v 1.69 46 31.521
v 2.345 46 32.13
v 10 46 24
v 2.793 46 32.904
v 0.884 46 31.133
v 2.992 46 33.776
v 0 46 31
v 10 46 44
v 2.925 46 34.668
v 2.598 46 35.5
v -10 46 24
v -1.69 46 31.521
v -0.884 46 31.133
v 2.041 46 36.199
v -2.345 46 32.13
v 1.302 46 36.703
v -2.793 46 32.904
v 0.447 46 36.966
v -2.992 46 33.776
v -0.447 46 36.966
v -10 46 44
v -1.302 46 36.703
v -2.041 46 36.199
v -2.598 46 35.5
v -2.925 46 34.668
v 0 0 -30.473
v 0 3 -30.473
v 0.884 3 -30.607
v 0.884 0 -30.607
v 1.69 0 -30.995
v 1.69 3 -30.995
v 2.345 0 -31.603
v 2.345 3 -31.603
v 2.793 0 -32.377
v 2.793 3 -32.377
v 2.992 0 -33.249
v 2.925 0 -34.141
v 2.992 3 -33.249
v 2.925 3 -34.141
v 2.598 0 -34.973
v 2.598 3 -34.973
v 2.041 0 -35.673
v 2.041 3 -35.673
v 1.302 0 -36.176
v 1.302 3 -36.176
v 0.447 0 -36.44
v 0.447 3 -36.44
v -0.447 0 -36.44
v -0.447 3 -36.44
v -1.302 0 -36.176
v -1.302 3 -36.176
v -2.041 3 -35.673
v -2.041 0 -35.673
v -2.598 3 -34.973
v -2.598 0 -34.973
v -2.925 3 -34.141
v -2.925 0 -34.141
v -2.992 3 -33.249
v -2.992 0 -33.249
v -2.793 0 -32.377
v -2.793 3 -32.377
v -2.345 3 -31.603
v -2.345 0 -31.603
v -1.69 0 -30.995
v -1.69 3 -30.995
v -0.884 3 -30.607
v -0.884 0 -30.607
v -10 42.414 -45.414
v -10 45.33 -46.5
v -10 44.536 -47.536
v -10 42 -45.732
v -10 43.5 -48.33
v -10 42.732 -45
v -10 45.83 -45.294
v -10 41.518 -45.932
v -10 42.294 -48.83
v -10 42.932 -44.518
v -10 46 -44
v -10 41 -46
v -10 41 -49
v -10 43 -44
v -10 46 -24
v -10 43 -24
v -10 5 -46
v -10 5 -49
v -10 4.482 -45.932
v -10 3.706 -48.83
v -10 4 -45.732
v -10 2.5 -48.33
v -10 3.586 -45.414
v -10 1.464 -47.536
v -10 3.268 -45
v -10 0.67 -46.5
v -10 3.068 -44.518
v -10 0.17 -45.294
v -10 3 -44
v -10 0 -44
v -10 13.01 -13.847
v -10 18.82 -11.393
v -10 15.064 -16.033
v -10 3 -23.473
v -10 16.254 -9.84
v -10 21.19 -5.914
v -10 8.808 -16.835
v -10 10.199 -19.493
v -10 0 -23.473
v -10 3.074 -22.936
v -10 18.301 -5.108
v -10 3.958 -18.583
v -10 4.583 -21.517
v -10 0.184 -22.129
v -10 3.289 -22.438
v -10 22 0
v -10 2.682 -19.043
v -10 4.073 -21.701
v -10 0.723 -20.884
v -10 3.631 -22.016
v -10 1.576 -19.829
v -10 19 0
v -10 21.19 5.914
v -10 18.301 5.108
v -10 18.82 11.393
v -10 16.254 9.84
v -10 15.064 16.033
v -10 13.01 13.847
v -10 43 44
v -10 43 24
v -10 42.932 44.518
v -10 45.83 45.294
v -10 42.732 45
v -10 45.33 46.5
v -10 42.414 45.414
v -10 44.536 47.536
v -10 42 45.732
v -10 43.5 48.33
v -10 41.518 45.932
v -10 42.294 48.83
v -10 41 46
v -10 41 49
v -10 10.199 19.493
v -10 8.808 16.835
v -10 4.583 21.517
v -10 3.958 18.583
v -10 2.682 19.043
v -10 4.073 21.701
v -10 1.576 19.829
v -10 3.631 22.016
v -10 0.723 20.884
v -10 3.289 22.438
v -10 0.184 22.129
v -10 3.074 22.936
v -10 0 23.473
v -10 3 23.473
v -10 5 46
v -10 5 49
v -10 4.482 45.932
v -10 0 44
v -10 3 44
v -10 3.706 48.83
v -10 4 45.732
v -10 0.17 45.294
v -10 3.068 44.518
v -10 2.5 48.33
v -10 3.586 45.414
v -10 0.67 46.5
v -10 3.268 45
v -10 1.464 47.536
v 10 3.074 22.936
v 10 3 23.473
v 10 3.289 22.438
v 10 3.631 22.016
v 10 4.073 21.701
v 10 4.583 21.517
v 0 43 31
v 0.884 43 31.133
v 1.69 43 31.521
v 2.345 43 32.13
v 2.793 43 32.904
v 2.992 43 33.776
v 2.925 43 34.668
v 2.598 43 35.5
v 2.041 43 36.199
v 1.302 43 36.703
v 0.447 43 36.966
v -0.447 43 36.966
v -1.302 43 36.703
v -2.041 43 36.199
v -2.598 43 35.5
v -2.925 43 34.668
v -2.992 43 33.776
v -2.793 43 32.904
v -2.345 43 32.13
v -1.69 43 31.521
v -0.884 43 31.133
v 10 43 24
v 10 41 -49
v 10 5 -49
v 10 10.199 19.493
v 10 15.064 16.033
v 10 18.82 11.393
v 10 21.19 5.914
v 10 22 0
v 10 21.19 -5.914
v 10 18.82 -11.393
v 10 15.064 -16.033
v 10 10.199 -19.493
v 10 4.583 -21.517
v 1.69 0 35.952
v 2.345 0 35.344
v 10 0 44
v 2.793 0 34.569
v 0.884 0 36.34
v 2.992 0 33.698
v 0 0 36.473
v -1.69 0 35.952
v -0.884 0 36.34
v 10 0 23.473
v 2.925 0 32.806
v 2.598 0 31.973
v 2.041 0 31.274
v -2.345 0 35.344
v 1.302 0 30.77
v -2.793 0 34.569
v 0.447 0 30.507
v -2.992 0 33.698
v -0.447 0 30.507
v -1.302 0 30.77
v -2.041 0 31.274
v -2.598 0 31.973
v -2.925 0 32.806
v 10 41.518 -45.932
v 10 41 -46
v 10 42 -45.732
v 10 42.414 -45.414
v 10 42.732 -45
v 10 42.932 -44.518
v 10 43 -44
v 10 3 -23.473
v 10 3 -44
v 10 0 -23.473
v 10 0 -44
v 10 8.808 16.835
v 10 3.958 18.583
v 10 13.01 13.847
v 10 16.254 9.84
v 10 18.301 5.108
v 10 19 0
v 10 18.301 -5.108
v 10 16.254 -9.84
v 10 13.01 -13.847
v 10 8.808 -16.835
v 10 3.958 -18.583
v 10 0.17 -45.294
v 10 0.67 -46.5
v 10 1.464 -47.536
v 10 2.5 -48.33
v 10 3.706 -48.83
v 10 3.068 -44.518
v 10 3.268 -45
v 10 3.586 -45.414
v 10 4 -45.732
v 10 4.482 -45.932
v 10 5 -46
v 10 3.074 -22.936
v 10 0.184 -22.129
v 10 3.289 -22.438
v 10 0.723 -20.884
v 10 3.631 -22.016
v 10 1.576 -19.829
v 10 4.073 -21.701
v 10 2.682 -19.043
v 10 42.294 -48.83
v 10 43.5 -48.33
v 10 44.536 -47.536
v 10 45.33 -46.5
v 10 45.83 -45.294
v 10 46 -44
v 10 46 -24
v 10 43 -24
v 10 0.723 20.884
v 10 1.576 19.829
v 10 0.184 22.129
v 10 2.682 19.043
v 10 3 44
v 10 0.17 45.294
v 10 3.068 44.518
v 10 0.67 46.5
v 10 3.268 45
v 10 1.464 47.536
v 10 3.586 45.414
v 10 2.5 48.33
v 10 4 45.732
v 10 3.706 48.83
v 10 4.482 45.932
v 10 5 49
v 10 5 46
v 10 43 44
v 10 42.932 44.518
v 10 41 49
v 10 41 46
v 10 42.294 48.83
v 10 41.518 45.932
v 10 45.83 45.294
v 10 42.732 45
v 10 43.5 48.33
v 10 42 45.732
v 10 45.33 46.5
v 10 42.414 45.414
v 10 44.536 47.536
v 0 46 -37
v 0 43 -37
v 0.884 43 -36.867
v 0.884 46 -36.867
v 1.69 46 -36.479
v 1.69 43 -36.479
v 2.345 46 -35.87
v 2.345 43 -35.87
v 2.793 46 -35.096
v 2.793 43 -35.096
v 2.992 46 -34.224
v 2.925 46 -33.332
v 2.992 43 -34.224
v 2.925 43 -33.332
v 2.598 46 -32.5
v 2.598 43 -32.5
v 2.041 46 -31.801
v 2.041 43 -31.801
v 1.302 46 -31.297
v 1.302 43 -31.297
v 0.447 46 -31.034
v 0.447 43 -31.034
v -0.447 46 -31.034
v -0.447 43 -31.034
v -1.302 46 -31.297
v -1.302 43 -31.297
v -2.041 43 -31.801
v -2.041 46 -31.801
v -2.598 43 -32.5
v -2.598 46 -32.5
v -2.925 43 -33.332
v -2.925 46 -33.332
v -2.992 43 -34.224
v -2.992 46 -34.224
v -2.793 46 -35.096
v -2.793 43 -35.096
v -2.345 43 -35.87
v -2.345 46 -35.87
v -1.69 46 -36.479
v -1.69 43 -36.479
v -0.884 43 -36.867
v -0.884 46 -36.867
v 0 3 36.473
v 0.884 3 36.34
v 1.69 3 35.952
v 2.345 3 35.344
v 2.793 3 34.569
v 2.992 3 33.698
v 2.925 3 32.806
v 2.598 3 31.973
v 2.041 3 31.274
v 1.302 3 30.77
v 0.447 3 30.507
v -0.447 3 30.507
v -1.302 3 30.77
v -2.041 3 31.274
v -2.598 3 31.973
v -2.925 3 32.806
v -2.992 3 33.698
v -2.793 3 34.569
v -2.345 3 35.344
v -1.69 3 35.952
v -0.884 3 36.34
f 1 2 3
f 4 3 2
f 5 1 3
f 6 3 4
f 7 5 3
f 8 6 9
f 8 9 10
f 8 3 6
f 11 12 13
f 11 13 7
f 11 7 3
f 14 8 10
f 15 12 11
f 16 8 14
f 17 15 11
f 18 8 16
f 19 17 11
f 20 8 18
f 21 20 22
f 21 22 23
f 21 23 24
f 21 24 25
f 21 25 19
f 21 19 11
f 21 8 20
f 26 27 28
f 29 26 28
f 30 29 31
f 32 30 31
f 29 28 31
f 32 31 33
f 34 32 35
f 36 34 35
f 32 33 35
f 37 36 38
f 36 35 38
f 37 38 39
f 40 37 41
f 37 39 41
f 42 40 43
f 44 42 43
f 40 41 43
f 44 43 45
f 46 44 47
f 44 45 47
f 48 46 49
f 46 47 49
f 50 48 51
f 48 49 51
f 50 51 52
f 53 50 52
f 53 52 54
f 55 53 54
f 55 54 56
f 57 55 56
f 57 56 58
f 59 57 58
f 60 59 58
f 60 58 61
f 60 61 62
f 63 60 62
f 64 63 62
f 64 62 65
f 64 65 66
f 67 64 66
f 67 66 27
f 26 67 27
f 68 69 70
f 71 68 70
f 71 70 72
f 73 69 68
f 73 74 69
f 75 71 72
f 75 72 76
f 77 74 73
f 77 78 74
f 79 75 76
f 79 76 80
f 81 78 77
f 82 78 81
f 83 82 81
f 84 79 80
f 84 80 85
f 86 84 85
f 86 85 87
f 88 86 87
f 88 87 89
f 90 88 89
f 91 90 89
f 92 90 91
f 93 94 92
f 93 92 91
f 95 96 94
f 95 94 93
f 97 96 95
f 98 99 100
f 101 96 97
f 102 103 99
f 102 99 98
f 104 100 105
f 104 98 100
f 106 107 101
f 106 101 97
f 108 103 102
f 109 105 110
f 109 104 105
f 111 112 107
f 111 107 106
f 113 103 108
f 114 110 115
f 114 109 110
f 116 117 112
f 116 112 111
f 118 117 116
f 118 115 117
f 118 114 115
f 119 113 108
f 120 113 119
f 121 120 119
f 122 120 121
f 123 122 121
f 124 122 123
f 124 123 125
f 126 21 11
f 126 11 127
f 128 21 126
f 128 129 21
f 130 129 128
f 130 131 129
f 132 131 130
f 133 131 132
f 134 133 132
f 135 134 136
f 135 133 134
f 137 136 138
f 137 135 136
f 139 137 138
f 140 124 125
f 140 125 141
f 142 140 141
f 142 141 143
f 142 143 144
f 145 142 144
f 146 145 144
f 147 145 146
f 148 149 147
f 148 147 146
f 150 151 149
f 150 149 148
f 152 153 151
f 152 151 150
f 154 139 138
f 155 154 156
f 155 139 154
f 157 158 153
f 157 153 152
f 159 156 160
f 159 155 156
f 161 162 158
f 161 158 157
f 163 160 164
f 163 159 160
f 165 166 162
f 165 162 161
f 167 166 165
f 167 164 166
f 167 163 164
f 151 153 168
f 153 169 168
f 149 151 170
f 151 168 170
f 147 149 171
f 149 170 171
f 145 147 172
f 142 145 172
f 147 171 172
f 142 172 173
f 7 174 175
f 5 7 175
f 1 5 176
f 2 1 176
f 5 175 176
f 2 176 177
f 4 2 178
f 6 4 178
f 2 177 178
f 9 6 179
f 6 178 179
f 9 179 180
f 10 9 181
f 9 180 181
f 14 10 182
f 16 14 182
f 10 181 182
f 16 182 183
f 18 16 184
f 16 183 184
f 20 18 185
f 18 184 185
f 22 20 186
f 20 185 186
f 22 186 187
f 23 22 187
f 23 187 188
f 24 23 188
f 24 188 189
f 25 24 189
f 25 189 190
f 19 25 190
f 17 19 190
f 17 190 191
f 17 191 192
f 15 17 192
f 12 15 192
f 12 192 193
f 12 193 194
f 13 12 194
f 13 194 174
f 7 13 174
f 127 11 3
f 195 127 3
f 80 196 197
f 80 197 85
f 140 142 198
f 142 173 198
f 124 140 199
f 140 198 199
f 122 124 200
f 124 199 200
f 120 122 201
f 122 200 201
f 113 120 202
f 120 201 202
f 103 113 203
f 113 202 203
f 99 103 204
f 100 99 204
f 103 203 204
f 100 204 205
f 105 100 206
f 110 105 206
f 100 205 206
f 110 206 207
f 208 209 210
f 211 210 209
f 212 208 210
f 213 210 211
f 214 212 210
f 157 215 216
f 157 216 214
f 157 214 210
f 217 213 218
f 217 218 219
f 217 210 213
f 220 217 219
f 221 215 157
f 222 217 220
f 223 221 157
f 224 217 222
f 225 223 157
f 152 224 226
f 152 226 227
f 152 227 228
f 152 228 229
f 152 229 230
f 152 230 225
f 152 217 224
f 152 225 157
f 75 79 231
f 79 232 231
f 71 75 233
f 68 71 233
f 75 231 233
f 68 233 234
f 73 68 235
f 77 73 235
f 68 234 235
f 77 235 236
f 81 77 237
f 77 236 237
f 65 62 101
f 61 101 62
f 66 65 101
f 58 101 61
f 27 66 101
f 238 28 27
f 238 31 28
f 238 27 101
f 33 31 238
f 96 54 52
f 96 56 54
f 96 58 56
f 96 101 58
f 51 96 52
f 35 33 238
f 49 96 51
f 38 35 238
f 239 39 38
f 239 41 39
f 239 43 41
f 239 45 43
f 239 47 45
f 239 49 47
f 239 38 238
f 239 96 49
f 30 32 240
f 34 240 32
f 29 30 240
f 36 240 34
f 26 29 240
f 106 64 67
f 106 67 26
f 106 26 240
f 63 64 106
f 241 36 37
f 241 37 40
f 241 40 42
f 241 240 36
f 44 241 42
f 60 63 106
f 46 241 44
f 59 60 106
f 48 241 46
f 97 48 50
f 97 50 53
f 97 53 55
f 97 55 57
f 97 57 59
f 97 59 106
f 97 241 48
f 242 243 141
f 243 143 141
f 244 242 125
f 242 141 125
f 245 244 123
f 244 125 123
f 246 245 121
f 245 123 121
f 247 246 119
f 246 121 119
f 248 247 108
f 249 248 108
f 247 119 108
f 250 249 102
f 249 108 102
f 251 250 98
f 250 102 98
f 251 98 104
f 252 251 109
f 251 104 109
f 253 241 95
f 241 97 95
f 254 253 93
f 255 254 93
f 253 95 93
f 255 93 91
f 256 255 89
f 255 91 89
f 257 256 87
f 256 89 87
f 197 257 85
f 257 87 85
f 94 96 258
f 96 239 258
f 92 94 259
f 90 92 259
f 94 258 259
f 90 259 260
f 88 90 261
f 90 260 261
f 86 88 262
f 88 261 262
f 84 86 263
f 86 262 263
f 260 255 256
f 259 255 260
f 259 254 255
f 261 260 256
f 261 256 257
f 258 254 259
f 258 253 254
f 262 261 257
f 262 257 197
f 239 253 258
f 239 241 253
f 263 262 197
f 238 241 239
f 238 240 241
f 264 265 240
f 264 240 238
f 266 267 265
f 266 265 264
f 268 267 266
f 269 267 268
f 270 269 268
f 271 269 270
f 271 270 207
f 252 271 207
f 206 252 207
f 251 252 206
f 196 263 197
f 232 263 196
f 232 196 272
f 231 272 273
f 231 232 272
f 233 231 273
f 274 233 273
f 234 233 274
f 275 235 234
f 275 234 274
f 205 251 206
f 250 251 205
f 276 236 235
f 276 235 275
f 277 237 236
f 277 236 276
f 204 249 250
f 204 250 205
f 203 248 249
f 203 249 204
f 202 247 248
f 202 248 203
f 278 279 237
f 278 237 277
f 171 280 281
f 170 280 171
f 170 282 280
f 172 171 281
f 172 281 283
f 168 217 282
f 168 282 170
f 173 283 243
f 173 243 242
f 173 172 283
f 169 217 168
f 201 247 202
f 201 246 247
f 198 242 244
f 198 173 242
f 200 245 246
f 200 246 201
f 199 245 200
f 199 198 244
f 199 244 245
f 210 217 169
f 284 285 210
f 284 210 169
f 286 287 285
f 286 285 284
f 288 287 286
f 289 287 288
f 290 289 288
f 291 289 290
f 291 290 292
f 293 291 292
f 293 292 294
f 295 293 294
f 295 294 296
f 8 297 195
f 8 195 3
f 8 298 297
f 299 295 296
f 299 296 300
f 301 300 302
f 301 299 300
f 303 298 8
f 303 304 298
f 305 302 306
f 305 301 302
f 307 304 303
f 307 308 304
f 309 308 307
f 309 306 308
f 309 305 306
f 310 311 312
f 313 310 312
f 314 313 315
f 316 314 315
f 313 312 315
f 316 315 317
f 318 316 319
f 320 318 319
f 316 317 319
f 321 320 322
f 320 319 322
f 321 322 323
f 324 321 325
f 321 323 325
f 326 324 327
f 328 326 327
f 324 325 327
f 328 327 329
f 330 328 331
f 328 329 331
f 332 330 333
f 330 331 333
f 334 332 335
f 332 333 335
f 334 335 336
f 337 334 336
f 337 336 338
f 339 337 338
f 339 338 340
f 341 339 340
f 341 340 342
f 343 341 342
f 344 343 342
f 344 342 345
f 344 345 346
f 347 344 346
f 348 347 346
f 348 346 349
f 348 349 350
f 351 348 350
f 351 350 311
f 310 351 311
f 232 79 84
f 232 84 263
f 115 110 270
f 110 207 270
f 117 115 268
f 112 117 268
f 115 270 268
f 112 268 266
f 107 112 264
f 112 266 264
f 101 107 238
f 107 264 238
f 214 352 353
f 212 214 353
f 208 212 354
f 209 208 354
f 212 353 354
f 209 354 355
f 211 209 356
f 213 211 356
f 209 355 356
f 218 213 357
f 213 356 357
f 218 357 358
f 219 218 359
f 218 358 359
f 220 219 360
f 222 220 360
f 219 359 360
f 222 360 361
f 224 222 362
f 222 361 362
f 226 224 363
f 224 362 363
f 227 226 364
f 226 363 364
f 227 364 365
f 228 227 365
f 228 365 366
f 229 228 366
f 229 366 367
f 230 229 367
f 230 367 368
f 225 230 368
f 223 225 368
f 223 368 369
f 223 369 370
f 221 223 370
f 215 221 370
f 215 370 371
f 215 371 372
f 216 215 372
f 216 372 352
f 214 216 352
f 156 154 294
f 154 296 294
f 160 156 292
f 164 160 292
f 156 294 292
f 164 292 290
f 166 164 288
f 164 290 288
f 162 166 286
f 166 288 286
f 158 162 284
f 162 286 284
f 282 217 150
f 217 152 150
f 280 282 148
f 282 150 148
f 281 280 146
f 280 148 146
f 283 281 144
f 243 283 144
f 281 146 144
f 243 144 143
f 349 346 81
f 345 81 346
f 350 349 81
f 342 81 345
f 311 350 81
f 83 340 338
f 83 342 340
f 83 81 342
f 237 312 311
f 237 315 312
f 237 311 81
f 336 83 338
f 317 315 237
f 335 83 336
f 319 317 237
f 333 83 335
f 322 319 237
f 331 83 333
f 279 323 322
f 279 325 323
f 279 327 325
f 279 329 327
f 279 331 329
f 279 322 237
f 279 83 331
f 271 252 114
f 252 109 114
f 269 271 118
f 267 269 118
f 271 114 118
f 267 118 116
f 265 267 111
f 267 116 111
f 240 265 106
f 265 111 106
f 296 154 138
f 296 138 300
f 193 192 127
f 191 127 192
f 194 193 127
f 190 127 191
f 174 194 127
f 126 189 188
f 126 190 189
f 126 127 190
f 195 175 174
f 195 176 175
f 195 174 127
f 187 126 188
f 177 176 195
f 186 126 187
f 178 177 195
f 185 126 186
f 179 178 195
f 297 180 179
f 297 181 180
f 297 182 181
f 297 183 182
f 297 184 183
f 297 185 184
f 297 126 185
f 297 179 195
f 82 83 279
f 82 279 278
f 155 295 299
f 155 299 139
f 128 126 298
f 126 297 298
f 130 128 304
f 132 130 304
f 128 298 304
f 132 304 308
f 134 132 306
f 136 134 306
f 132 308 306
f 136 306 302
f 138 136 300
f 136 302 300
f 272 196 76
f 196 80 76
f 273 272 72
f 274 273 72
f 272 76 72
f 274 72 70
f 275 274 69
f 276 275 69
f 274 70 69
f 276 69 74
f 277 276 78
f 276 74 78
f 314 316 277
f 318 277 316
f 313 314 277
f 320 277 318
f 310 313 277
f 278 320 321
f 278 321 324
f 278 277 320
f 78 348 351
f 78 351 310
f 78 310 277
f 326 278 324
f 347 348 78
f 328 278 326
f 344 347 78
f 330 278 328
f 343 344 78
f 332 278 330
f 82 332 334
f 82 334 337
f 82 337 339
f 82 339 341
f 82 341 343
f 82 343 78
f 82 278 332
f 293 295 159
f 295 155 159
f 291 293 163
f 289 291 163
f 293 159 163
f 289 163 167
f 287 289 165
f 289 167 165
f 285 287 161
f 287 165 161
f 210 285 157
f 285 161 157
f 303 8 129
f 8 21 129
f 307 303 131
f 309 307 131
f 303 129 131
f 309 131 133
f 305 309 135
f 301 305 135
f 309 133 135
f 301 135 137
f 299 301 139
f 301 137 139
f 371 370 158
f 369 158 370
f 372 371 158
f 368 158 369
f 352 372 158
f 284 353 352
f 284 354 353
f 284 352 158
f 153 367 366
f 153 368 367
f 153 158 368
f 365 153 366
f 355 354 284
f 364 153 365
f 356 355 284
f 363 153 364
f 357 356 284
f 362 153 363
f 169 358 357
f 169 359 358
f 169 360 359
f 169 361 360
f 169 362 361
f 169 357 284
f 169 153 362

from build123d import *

# Parameters (mm, degrees)
SKETCH8_W          = 20
SKETCH8_H          = 3
SKETCH10_R         = 3
CUT_EXTRUDE1_DEPTH = 66.954529791
SKETCH11_R         = 3
CUT_EXTRUDE2_DEPTH = 66.954529791


with BuildPart() as part:
    # Sweep1: sweep along a path in Sketch7
    with BuildLine(Plane(origin=(0, 0, 0), x_dir=(0, 0, -1), z_dir=(1, 0, 0))) as sweep1_path:
        Line((-24, 46), (-44, 46))
        ThreePointArc((-44, 46), (-47.535533906, 44.535533906), (-49, 41))
        Line((-49, 41), (-49, 5))
        ThreePointArc((-49, 5), (-47.535533906, 1.464466094), (-44, 0))
        Line((-44, 0), (-23.473389189, 0))
        ThreePointArc((-23.473389189, 0), (-20.327624841, 1.113592061), (-18.583099774, 3.958333333))
        ThreePointArc((-18.583099774, 3.958333333), (0, 19), (18.583099774, 3.958333333))
        ThreePointArc((18.583099774, 3.958333333), (20.327624841, 1.113592061), (23.473389189, 0))
        Line((23.473389189, 0), (44, 0))
        ThreePointArc((44, 0), (47.535533906, 1.464466094), (49, 5))
        Line((49, 5), (49, 41))
        ThreePointArc((49, 41), (47.535533906, 44.535533906), (44, 46))
        Line((44, 46), (24, 46))
    # Sketch8 → Sweep1 (sweep)
    with BuildSketch(Plane.XY.offset(24)):
        with Locations((0, 44.5)):
            Rectangle(SKETCH8_W, SKETCH8_H)
    sweep(path=sweep1_path.line)

    # Sketch10 → Cut-Extrude1 (cut, through all)
    with BuildSketch(Plane(origin=(0, 3, 0), x_dir=(1, 0, 0), z_dir=(0, 1, 0))):
        with Locations(Location((0, 33.473389189, 0), (0, 0, 270))):
            Circle(SKETCH10_R)
        with Locations(Location((0, -33.473389189, 0), (0, 0, 270))):
            Circle(SKETCH10_R)
    extrude(amount=-CUT_EXTRUDE1_DEPTH, mode=Mode.SUBTRACT)

    # Sketch11 → Cut-Extrude2 (cut, through all)
    with BuildSketch(Plane.XZ.offset(-43)):
        with Locations(Location((0, 34, 0), (0, 0, 270))):
            Circle(SKETCH11_R)
        with Locations(Location((0, -34, 0), (0, 0, 270))):
            Circle(SKETCH11_R)
    extrude(amount=-CUT_EXTRUDE2_DEPTH, mode=Mode.SUBTRACT)


solid = part.part
